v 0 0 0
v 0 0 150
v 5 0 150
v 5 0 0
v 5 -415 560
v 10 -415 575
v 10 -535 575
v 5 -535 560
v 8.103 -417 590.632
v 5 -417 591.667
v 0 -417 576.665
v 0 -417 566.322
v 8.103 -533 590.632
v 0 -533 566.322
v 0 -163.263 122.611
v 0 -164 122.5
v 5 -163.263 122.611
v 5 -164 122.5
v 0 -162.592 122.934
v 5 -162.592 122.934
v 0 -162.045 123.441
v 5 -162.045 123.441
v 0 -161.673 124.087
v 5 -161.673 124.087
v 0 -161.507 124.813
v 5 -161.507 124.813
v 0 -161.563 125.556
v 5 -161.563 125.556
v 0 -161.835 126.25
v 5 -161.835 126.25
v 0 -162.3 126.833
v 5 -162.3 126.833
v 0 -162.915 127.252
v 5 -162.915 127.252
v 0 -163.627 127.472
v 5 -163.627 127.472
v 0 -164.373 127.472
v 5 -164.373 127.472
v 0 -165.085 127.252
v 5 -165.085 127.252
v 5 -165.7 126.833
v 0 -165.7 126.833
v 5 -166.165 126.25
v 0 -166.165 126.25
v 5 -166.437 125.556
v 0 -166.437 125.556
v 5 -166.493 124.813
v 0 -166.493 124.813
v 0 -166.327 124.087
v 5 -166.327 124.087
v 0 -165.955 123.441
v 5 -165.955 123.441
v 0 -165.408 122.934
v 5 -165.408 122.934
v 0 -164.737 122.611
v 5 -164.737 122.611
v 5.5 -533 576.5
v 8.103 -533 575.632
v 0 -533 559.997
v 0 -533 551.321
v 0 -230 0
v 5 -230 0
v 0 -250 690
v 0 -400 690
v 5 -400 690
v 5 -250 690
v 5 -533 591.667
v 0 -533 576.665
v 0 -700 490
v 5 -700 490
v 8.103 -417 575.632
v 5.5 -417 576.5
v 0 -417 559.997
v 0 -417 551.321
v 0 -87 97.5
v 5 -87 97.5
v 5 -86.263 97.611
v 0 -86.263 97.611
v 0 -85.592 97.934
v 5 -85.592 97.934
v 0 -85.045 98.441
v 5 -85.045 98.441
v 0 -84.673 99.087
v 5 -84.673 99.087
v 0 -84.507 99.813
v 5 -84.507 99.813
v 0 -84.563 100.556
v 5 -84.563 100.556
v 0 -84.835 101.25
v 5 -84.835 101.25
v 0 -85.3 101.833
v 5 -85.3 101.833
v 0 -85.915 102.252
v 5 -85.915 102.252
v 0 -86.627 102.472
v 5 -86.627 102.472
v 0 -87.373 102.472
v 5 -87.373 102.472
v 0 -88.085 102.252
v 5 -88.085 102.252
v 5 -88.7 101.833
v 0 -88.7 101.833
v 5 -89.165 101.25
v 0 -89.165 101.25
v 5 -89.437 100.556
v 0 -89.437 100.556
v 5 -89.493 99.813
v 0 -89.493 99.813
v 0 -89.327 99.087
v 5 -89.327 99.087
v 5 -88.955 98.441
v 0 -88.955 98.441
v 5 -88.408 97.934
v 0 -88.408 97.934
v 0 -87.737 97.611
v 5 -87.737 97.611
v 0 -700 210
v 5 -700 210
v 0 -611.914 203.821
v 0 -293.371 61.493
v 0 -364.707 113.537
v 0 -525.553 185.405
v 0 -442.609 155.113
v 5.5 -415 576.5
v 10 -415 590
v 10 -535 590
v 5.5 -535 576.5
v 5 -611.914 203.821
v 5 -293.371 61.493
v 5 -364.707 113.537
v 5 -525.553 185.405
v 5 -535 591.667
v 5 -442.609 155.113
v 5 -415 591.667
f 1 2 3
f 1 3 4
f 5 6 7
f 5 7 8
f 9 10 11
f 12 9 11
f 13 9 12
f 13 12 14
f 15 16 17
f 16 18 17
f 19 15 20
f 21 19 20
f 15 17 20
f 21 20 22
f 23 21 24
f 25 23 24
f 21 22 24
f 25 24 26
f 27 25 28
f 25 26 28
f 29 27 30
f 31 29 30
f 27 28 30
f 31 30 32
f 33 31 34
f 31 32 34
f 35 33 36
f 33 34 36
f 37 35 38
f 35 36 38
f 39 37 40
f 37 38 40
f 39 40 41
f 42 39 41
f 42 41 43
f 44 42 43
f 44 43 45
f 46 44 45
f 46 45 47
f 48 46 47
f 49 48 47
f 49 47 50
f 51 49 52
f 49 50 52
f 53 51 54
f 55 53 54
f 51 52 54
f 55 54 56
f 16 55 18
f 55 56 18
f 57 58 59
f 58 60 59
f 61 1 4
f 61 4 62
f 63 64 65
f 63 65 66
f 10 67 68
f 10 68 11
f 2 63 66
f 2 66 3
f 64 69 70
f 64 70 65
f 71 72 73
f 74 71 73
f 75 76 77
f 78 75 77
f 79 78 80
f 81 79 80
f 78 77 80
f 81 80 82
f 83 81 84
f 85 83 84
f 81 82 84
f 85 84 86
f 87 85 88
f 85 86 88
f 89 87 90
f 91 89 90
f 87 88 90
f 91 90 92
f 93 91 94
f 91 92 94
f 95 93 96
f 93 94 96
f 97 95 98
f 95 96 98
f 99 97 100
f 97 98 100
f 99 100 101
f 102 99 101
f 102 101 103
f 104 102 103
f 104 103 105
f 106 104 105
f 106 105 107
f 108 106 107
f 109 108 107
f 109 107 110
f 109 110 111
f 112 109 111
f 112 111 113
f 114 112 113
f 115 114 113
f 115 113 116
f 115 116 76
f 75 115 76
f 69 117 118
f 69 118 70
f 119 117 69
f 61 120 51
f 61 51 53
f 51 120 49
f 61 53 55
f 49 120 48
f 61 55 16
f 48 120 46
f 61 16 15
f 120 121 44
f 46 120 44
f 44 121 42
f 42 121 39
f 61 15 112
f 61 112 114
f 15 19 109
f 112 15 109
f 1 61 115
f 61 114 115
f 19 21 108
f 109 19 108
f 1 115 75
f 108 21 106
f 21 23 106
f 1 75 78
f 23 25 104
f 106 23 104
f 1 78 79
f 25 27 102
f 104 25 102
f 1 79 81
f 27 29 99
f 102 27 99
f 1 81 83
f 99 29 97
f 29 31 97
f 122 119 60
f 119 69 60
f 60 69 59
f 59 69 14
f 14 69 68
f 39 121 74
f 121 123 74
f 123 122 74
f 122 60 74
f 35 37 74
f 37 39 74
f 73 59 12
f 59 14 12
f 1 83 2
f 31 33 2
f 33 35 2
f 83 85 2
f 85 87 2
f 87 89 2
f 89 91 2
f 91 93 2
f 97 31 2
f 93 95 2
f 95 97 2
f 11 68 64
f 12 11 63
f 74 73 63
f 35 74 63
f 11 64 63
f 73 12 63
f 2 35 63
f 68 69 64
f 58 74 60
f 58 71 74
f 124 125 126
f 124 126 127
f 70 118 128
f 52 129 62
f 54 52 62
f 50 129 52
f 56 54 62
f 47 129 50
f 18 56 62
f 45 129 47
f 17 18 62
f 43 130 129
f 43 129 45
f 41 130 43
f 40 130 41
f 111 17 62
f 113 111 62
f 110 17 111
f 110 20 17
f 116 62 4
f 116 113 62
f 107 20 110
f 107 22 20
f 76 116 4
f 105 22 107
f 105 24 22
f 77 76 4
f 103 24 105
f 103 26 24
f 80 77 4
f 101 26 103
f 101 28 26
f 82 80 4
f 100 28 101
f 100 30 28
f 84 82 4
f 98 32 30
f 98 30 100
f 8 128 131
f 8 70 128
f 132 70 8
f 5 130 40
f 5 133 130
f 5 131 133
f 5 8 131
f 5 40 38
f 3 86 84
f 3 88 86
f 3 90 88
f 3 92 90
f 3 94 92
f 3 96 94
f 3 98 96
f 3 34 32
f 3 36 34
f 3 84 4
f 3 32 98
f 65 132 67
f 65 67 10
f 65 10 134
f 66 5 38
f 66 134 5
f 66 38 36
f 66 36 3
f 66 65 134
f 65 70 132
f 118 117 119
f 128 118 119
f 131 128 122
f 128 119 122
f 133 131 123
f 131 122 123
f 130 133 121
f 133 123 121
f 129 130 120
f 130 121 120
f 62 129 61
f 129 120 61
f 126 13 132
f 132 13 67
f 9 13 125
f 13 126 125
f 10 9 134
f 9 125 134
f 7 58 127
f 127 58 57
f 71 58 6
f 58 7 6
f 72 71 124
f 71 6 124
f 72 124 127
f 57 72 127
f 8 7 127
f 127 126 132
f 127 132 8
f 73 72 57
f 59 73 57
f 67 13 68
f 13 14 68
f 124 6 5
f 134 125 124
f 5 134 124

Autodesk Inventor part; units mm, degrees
ref_plane "YZ Plane" through (0, 0, 0) normal (1, 0, 0) x (0, 1, 0)
ref_plane "XY Plane" through (0, 0, 0) normal (0, 0, 1) x (1, 0, 0)
sketch "スケッチ1" plane through (0, 0, 0) normal (1, 0, 0) x (0, 1, 0)
  line L0 (-700, 210) -> (-700, 490)
  line L1 (-700, 490) -> (-400, 690)
  line L2 (-400, 690) -> (-250, 690)
  line L3 (-250, 690) -> (0, 150)
  line L4 (0, 150) -> (0, 0)
  line L5 (0, 0) -> (-230, 0)
  arc A0 (-230, 0) -> (-700, 210) centre (-700, -420.9524) ccw
  dimension "d0" = 690
  dimension "d1" = 280
  dimension "d2" = 200
  dimension "d3" = 300
  dimension "d4" = 150
  dimension "d5" = 700
  dimension "d6" = 230
  dimension "d7" = 150
extrude "押し出し1" add sketch "スケッチ1" along normal blind 5
sketch "スケッチ2" plane through (5, 0, 0) normal (1, 0, 0) x (0, 0, -1)
  circle A0 centre (-100, -87) radius 2.5
  line L0 (0, 0) -> (-150, 0) projected
  line L1 (0, -230) -> (0, 0) projected
  circle A1 centre (-125, -164) radius 2.5
  dimension "d10" = 87
  dimension "d11" = 100
  dimension "d12" = 5
  dimension "d13" = 164
  dimension "d14" = 125
  dimension "d15" = 5
extrude "押し出し2" cut sketch "スケッチ2" against normal through all
ref_plane "作業平面1" through (0, -415, 0) normal (0, 1, 0) x (-1, 0, 0)
sketch "スケッチ6" plane through (0, -415, 0) normal (0, 1, 0) x (-1, 0, 0)
  line L0 (-10, 590) -> (-5, 575)
  line L1 (-10, 575) -> (-5, 560)
  line L2 (-5, 150) -> (-5, 690) projected
  line L3 (-10, 575) -> (-5.5, 576.5)
  line L4 (-10, 590) -> (-5, 591.6667)
  point P0 (0, 0)
  dimension "d48" = 15
  dimension "d55" = 15
  dimension "d56" = 15
extrude "押し出し6" add sketch "スケッチ6" against normal blind 120
sketch "スケッチ7" plane through (5, -535, 591.6667) normal (0.3162, 0, 0.9487) x (0.9487, 0, -0.3162)
  line L0 (0, 0) -> (0, 120) projected
  line L1 (0, 118) -> (3.2705, 118)
  line L2 (3.2705, 118) -> (3.2705, 2)
  line L3 (3.2705, 2) -> (0, 2)
  line L4 (0, 2) -> (0, 118)
  line L5 (5.2705, 120) -> (5.2705, 0) projected
  line L6 (5.2705, 118) -> (8.0139, 118)
  line L7 (8.0139, 118) -> (8.0139, 2)
  line L8 (8.0139, 2) -> (5.2705, 2)
  line L9 (5.2705, 2) -> (5.2705, 118)
  line L10 (5.2705, 0) -> (0, 0) projected
  line L11 (10.0139, 120) -> (10.0139, 0) projected
  line L12 (0, 120) -> (5.2705, 120) projected
  point P0 (182.358, 535)
  dimension "d57" = 2
  dimension "d58" = 2
  dimension "d59" = 2
  dimension "d60" = 2
extrude "押し出し7" cut sketch "スケッチ7" against normal through all contours L0 L1 L2 L3 | L5 L6 L7 L8
equation "\"d59\" = d58"
properties part number "end_plate" material "CFRP"
